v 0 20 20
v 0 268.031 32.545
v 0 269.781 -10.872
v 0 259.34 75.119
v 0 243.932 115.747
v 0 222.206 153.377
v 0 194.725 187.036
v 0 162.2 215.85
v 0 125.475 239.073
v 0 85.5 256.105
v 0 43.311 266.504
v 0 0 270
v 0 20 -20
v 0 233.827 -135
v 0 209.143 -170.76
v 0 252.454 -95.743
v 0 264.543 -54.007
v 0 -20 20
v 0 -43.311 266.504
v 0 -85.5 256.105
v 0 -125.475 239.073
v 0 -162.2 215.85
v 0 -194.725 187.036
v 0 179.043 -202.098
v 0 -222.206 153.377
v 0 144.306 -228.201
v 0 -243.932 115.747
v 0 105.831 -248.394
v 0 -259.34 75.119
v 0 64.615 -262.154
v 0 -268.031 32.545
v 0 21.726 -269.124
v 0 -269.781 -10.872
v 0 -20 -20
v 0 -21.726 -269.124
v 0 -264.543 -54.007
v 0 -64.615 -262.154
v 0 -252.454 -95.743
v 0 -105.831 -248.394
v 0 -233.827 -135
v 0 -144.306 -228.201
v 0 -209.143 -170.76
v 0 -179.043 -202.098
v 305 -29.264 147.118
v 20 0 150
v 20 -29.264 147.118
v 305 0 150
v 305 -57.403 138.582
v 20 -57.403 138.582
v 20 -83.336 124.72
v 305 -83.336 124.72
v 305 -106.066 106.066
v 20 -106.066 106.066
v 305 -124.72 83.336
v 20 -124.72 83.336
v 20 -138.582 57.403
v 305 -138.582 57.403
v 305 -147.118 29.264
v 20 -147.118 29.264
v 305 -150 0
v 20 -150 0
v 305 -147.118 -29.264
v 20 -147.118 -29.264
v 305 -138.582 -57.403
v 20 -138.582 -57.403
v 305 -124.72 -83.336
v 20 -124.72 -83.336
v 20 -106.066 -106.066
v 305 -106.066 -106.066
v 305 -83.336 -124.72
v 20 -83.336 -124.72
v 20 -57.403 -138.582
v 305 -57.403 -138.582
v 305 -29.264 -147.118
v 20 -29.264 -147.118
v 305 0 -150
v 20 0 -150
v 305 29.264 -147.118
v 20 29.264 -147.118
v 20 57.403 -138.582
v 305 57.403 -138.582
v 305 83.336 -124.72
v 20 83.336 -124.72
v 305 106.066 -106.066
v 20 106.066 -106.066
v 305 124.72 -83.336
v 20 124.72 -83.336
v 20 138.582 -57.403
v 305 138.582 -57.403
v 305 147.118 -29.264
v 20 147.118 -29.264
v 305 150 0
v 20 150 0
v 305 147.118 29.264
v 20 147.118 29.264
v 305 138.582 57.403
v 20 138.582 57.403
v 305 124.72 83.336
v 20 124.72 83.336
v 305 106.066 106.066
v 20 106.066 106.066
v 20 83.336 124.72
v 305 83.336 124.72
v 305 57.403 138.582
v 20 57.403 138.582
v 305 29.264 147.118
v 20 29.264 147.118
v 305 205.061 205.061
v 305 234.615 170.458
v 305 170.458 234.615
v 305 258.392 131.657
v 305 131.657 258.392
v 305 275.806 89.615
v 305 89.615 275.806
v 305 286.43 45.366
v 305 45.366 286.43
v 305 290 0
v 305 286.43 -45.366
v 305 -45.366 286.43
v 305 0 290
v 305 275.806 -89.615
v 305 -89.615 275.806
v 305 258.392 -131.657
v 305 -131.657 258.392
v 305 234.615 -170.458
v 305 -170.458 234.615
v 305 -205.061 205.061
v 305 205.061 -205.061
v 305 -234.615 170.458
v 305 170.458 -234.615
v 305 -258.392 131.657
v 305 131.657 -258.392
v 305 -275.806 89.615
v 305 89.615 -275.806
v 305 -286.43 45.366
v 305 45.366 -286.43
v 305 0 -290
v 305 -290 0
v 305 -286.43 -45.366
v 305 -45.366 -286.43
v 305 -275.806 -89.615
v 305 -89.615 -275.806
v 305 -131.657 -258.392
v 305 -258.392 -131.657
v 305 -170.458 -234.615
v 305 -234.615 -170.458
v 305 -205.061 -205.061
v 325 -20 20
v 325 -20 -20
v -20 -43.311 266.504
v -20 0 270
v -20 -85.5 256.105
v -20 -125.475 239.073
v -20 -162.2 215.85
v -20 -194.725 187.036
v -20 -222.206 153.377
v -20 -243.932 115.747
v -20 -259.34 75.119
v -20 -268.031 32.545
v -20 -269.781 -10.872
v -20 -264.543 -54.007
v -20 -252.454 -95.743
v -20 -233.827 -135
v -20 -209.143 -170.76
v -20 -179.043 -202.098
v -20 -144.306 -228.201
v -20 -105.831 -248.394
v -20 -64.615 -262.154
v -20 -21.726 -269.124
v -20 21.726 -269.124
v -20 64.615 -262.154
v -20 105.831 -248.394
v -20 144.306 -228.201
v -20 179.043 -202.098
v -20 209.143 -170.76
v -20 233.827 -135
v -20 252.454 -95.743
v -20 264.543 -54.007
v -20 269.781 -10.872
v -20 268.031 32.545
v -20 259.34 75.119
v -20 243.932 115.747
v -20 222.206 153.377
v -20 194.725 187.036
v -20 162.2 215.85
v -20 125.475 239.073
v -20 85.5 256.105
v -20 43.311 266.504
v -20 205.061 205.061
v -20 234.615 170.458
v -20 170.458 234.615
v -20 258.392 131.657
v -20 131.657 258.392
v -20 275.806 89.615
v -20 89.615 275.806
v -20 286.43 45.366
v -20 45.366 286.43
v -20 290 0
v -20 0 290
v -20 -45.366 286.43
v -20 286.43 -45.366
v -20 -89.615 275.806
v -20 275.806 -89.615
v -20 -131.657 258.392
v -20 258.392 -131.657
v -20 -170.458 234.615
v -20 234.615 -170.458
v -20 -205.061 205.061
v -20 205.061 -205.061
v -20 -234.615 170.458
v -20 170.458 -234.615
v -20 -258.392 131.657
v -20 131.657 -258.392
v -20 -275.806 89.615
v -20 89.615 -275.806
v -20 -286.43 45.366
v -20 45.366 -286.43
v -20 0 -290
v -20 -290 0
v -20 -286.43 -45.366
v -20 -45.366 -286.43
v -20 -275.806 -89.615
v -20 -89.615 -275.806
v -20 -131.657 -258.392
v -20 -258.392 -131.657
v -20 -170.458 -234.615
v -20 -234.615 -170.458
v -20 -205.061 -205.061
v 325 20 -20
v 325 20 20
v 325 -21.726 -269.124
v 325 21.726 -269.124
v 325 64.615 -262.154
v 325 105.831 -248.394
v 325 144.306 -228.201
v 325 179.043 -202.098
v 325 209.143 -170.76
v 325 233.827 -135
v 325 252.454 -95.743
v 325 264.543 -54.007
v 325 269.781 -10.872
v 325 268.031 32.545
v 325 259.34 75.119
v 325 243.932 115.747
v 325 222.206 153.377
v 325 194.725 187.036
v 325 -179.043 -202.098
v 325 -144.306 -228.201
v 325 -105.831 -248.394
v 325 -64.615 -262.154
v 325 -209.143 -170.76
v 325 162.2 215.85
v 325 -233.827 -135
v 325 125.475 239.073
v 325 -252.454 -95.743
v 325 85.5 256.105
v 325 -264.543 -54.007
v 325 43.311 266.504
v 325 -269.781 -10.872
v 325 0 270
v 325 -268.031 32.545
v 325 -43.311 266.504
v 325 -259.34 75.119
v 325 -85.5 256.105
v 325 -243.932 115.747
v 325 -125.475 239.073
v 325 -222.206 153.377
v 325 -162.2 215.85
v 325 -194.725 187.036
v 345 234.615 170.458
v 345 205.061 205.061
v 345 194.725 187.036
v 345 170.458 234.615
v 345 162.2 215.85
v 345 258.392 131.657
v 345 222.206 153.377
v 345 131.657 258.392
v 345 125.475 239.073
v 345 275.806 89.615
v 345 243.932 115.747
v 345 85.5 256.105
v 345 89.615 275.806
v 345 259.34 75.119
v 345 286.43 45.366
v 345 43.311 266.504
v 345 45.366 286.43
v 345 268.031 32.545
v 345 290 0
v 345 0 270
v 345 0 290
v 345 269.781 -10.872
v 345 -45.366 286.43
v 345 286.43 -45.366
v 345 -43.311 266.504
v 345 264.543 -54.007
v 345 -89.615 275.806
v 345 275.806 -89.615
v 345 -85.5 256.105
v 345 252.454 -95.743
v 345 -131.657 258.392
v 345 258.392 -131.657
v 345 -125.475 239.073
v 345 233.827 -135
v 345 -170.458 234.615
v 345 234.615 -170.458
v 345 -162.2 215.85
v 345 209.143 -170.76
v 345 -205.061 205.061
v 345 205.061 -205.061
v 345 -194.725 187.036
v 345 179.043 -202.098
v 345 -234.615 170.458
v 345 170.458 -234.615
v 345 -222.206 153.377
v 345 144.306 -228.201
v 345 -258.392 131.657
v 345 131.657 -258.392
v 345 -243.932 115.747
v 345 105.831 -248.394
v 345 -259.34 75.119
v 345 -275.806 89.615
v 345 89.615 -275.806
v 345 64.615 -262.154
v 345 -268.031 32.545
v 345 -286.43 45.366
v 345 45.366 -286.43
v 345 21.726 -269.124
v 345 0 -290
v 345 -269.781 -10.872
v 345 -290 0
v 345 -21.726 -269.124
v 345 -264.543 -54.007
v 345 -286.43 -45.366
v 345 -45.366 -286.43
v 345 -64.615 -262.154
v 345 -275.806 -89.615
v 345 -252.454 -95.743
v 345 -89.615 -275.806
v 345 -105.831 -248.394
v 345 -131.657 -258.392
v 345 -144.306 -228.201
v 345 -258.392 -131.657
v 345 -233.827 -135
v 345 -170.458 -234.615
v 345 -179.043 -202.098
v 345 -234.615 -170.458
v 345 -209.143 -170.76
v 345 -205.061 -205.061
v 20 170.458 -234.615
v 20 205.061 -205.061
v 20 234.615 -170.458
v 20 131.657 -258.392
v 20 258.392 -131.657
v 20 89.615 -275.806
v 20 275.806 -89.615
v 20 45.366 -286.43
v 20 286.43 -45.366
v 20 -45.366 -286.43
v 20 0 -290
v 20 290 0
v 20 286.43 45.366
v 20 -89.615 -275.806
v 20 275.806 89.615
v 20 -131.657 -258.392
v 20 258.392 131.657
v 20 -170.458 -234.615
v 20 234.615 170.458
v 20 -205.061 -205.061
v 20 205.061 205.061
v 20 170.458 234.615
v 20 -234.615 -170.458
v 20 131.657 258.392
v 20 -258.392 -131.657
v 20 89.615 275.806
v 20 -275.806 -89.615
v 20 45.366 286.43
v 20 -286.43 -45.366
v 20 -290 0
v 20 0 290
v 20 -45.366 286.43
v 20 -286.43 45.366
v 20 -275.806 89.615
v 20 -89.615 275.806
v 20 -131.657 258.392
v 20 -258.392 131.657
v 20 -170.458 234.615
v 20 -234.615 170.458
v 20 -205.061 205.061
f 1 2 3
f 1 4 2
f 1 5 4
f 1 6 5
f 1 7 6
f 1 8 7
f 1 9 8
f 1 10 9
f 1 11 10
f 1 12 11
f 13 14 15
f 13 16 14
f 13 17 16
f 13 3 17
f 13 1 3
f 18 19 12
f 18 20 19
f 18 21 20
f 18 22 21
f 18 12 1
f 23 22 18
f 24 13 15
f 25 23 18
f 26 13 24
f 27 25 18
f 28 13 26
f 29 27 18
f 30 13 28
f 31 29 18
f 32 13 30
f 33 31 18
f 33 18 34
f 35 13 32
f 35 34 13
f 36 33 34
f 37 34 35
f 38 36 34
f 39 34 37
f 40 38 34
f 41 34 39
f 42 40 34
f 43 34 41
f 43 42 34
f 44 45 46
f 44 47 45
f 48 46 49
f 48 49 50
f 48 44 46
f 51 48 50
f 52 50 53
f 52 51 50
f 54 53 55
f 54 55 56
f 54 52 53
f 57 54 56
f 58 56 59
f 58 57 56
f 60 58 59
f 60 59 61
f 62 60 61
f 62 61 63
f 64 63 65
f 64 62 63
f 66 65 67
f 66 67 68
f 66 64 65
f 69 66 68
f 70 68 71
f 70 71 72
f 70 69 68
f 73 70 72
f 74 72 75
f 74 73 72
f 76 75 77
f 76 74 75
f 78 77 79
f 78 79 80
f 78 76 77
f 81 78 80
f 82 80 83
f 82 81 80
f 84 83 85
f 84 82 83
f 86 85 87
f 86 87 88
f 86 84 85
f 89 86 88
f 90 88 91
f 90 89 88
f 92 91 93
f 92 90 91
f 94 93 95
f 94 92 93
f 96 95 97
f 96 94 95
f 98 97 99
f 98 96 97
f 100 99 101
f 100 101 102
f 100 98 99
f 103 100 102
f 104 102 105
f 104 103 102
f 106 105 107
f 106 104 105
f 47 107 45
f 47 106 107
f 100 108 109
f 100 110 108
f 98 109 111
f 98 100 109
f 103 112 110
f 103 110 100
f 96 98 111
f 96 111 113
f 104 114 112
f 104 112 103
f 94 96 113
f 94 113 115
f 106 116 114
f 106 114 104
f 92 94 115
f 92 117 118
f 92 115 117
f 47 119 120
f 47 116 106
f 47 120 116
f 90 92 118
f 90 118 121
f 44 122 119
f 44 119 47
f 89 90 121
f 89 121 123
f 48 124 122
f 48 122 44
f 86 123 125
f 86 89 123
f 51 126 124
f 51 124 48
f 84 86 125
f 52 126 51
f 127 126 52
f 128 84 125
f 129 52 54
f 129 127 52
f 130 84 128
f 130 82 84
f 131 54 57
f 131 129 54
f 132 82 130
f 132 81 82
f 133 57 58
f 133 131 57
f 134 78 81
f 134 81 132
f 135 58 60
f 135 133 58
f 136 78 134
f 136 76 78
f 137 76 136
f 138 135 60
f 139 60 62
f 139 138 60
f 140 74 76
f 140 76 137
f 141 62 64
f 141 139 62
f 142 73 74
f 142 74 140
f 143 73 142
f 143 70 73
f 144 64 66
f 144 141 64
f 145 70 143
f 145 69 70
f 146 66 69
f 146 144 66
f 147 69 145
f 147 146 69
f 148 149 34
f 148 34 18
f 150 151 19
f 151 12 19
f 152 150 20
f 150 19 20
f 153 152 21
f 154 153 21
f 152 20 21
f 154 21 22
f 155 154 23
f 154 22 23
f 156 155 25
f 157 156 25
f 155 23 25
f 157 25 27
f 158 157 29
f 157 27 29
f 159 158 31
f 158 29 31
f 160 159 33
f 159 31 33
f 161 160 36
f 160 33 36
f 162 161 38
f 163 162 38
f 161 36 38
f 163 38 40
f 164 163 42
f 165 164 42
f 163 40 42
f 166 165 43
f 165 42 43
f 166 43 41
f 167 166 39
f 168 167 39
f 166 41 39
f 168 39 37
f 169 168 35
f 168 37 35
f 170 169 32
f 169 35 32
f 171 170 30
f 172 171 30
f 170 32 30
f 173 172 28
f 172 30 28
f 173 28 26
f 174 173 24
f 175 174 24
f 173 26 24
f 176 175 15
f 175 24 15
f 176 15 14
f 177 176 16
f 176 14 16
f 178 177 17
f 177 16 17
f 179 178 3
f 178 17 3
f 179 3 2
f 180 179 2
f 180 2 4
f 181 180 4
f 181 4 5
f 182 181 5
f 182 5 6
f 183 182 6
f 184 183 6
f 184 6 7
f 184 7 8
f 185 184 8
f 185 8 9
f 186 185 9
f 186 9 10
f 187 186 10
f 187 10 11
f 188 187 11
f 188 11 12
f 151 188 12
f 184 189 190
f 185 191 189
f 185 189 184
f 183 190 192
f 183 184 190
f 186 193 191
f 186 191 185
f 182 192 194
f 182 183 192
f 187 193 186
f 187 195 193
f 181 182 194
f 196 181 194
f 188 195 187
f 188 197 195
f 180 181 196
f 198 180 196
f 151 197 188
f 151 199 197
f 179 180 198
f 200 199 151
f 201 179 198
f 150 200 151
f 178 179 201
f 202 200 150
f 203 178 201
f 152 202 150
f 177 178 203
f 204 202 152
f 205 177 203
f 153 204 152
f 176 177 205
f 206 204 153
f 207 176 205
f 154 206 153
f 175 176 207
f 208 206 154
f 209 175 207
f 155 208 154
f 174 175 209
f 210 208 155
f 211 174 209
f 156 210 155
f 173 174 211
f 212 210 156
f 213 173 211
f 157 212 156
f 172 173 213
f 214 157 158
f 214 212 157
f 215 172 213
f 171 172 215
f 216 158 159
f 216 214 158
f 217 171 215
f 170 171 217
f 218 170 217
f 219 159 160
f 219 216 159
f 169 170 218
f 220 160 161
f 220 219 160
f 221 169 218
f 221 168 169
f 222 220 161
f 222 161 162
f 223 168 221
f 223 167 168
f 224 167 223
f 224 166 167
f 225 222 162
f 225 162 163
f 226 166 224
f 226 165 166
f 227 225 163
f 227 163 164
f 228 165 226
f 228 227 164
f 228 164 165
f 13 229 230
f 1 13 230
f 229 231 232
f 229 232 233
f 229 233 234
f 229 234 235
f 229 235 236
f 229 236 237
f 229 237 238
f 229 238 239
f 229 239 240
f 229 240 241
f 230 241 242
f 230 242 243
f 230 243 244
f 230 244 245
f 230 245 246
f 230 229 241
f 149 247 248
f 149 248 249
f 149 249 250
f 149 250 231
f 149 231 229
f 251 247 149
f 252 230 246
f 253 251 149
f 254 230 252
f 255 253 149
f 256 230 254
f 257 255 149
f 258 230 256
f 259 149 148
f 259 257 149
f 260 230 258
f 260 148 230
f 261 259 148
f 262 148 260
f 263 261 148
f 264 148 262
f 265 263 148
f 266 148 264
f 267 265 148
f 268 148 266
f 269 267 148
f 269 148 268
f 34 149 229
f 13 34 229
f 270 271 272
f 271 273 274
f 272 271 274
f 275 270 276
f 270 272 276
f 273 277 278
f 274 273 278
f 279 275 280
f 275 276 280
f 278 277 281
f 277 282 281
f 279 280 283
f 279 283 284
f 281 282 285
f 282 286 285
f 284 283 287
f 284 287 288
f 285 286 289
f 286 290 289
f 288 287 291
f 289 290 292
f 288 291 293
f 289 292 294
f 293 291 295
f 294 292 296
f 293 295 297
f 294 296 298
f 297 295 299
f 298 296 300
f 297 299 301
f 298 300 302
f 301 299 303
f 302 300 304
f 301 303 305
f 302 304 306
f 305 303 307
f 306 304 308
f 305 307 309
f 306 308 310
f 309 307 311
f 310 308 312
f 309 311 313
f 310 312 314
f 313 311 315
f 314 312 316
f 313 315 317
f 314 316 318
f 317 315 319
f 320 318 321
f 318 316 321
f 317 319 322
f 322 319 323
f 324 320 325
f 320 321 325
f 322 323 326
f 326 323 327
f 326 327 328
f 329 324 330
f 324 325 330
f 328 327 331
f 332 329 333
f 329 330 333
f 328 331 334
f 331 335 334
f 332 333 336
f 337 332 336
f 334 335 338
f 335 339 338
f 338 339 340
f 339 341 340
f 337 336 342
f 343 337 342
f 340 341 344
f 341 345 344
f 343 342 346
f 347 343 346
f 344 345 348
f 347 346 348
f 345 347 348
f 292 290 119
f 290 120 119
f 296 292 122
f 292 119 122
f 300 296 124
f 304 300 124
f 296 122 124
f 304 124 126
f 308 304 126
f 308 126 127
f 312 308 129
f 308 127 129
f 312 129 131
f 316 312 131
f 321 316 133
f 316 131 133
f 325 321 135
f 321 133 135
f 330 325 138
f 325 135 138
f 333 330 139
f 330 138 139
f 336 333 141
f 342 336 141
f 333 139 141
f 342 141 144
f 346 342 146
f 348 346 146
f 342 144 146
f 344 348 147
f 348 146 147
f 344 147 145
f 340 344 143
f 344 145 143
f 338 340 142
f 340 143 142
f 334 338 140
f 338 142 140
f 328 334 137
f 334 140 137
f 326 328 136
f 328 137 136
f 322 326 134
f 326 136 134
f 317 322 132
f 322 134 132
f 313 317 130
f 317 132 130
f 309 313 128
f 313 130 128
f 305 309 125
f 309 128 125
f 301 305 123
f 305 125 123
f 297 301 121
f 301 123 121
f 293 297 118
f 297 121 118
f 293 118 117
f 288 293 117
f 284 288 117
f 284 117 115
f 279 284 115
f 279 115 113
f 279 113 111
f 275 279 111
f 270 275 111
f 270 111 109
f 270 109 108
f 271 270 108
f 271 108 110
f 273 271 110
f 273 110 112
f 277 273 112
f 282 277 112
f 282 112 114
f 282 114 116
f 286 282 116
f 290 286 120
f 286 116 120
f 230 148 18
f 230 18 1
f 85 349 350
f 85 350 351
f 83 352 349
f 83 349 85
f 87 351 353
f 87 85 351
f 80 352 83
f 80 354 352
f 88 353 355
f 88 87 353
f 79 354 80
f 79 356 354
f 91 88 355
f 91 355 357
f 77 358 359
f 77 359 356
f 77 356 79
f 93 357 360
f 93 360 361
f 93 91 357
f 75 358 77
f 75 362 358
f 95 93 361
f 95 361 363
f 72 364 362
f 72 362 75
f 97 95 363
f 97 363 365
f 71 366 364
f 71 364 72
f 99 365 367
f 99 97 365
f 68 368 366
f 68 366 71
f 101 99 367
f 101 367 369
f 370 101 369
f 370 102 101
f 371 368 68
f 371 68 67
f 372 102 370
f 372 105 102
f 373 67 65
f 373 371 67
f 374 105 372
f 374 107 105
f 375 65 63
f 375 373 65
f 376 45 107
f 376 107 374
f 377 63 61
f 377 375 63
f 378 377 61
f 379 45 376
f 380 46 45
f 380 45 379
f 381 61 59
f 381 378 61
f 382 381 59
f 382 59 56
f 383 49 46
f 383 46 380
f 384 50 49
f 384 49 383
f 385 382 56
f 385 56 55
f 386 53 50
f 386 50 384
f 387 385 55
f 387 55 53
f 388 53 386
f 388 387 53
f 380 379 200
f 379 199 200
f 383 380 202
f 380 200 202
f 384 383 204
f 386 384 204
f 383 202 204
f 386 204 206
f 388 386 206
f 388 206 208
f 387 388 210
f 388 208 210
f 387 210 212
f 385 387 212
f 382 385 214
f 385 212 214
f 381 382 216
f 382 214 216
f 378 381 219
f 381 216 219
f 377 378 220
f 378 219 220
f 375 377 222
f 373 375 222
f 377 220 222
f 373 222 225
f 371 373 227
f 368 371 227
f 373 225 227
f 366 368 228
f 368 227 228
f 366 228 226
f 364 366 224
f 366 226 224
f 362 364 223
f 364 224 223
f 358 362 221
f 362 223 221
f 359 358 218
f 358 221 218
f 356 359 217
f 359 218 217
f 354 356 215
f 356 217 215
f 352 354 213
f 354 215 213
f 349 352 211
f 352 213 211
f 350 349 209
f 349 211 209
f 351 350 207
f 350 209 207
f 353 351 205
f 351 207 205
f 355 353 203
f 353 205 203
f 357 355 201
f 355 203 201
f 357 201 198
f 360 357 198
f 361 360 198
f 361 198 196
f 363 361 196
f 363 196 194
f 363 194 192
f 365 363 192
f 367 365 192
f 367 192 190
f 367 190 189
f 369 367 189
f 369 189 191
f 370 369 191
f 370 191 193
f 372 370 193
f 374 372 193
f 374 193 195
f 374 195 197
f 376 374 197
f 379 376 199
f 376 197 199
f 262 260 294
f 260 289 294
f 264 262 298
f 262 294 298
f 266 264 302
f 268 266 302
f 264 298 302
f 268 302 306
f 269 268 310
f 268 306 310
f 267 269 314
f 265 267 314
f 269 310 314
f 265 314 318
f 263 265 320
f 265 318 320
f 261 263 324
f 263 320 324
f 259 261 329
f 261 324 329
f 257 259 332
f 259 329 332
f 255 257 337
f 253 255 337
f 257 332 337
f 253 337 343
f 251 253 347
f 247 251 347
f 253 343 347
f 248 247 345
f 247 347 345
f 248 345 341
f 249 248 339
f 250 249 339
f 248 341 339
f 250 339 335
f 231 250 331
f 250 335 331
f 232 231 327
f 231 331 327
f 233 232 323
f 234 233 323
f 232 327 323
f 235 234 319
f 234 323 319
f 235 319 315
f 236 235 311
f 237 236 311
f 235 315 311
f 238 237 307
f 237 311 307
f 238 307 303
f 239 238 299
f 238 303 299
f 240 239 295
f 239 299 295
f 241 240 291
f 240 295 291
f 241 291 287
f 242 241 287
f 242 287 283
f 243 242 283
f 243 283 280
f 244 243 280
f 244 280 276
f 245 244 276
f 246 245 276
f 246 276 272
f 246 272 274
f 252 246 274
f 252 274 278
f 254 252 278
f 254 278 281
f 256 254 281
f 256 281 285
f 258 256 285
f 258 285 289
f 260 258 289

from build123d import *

# Parameters (mm, degrees)
ESQUISSE1_W             = 20
ESQUISSE1_H             = 20
ESQUISSE2_W             = 40
ESQUISSE2_H             = 40
ENL_V_MAT_EXTRU_1_DEPTH = 536.933764564


with BuildPart() as part:
    # Esquisse1 → Révolution1 (revolve)
    with BuildSketch(Plane.XY, mode=Mode.PRIVATE) as r_volution1_sk:
        Polygon((0, 0), (0, 290), (20, 290), (20, 150), (305, 150), (305, 290), (325, 290), (325, 0), align=None)
        with Locations((335, 280)):
            Rectangle(ESQUISSE1_W, ESQUISSE1_H)
        with Locations((-10, 280)):
            Rectangle(ESQUISSE1_W, ESQUISSE1_H)
    revolve(r_volution1_sk.sketch.rotate(Axis((0, 0, 0), (1, 0, 0)), 90), axis=Axis((0, 0, 0), (1, 0, 0)))

    # Esquisse2 → Enlèv. mat.-Extru.1 (cut, through all)
    with BuildSketch(Plane.ZY):
        Rectangle(ESQUISSE2_W, ESQUISSE2_H)
    extrude(amount=-ENL_V_MAT_EXTRU_1_DEPTH, mode=Mode.SUBTRACT)


solid = part.part
